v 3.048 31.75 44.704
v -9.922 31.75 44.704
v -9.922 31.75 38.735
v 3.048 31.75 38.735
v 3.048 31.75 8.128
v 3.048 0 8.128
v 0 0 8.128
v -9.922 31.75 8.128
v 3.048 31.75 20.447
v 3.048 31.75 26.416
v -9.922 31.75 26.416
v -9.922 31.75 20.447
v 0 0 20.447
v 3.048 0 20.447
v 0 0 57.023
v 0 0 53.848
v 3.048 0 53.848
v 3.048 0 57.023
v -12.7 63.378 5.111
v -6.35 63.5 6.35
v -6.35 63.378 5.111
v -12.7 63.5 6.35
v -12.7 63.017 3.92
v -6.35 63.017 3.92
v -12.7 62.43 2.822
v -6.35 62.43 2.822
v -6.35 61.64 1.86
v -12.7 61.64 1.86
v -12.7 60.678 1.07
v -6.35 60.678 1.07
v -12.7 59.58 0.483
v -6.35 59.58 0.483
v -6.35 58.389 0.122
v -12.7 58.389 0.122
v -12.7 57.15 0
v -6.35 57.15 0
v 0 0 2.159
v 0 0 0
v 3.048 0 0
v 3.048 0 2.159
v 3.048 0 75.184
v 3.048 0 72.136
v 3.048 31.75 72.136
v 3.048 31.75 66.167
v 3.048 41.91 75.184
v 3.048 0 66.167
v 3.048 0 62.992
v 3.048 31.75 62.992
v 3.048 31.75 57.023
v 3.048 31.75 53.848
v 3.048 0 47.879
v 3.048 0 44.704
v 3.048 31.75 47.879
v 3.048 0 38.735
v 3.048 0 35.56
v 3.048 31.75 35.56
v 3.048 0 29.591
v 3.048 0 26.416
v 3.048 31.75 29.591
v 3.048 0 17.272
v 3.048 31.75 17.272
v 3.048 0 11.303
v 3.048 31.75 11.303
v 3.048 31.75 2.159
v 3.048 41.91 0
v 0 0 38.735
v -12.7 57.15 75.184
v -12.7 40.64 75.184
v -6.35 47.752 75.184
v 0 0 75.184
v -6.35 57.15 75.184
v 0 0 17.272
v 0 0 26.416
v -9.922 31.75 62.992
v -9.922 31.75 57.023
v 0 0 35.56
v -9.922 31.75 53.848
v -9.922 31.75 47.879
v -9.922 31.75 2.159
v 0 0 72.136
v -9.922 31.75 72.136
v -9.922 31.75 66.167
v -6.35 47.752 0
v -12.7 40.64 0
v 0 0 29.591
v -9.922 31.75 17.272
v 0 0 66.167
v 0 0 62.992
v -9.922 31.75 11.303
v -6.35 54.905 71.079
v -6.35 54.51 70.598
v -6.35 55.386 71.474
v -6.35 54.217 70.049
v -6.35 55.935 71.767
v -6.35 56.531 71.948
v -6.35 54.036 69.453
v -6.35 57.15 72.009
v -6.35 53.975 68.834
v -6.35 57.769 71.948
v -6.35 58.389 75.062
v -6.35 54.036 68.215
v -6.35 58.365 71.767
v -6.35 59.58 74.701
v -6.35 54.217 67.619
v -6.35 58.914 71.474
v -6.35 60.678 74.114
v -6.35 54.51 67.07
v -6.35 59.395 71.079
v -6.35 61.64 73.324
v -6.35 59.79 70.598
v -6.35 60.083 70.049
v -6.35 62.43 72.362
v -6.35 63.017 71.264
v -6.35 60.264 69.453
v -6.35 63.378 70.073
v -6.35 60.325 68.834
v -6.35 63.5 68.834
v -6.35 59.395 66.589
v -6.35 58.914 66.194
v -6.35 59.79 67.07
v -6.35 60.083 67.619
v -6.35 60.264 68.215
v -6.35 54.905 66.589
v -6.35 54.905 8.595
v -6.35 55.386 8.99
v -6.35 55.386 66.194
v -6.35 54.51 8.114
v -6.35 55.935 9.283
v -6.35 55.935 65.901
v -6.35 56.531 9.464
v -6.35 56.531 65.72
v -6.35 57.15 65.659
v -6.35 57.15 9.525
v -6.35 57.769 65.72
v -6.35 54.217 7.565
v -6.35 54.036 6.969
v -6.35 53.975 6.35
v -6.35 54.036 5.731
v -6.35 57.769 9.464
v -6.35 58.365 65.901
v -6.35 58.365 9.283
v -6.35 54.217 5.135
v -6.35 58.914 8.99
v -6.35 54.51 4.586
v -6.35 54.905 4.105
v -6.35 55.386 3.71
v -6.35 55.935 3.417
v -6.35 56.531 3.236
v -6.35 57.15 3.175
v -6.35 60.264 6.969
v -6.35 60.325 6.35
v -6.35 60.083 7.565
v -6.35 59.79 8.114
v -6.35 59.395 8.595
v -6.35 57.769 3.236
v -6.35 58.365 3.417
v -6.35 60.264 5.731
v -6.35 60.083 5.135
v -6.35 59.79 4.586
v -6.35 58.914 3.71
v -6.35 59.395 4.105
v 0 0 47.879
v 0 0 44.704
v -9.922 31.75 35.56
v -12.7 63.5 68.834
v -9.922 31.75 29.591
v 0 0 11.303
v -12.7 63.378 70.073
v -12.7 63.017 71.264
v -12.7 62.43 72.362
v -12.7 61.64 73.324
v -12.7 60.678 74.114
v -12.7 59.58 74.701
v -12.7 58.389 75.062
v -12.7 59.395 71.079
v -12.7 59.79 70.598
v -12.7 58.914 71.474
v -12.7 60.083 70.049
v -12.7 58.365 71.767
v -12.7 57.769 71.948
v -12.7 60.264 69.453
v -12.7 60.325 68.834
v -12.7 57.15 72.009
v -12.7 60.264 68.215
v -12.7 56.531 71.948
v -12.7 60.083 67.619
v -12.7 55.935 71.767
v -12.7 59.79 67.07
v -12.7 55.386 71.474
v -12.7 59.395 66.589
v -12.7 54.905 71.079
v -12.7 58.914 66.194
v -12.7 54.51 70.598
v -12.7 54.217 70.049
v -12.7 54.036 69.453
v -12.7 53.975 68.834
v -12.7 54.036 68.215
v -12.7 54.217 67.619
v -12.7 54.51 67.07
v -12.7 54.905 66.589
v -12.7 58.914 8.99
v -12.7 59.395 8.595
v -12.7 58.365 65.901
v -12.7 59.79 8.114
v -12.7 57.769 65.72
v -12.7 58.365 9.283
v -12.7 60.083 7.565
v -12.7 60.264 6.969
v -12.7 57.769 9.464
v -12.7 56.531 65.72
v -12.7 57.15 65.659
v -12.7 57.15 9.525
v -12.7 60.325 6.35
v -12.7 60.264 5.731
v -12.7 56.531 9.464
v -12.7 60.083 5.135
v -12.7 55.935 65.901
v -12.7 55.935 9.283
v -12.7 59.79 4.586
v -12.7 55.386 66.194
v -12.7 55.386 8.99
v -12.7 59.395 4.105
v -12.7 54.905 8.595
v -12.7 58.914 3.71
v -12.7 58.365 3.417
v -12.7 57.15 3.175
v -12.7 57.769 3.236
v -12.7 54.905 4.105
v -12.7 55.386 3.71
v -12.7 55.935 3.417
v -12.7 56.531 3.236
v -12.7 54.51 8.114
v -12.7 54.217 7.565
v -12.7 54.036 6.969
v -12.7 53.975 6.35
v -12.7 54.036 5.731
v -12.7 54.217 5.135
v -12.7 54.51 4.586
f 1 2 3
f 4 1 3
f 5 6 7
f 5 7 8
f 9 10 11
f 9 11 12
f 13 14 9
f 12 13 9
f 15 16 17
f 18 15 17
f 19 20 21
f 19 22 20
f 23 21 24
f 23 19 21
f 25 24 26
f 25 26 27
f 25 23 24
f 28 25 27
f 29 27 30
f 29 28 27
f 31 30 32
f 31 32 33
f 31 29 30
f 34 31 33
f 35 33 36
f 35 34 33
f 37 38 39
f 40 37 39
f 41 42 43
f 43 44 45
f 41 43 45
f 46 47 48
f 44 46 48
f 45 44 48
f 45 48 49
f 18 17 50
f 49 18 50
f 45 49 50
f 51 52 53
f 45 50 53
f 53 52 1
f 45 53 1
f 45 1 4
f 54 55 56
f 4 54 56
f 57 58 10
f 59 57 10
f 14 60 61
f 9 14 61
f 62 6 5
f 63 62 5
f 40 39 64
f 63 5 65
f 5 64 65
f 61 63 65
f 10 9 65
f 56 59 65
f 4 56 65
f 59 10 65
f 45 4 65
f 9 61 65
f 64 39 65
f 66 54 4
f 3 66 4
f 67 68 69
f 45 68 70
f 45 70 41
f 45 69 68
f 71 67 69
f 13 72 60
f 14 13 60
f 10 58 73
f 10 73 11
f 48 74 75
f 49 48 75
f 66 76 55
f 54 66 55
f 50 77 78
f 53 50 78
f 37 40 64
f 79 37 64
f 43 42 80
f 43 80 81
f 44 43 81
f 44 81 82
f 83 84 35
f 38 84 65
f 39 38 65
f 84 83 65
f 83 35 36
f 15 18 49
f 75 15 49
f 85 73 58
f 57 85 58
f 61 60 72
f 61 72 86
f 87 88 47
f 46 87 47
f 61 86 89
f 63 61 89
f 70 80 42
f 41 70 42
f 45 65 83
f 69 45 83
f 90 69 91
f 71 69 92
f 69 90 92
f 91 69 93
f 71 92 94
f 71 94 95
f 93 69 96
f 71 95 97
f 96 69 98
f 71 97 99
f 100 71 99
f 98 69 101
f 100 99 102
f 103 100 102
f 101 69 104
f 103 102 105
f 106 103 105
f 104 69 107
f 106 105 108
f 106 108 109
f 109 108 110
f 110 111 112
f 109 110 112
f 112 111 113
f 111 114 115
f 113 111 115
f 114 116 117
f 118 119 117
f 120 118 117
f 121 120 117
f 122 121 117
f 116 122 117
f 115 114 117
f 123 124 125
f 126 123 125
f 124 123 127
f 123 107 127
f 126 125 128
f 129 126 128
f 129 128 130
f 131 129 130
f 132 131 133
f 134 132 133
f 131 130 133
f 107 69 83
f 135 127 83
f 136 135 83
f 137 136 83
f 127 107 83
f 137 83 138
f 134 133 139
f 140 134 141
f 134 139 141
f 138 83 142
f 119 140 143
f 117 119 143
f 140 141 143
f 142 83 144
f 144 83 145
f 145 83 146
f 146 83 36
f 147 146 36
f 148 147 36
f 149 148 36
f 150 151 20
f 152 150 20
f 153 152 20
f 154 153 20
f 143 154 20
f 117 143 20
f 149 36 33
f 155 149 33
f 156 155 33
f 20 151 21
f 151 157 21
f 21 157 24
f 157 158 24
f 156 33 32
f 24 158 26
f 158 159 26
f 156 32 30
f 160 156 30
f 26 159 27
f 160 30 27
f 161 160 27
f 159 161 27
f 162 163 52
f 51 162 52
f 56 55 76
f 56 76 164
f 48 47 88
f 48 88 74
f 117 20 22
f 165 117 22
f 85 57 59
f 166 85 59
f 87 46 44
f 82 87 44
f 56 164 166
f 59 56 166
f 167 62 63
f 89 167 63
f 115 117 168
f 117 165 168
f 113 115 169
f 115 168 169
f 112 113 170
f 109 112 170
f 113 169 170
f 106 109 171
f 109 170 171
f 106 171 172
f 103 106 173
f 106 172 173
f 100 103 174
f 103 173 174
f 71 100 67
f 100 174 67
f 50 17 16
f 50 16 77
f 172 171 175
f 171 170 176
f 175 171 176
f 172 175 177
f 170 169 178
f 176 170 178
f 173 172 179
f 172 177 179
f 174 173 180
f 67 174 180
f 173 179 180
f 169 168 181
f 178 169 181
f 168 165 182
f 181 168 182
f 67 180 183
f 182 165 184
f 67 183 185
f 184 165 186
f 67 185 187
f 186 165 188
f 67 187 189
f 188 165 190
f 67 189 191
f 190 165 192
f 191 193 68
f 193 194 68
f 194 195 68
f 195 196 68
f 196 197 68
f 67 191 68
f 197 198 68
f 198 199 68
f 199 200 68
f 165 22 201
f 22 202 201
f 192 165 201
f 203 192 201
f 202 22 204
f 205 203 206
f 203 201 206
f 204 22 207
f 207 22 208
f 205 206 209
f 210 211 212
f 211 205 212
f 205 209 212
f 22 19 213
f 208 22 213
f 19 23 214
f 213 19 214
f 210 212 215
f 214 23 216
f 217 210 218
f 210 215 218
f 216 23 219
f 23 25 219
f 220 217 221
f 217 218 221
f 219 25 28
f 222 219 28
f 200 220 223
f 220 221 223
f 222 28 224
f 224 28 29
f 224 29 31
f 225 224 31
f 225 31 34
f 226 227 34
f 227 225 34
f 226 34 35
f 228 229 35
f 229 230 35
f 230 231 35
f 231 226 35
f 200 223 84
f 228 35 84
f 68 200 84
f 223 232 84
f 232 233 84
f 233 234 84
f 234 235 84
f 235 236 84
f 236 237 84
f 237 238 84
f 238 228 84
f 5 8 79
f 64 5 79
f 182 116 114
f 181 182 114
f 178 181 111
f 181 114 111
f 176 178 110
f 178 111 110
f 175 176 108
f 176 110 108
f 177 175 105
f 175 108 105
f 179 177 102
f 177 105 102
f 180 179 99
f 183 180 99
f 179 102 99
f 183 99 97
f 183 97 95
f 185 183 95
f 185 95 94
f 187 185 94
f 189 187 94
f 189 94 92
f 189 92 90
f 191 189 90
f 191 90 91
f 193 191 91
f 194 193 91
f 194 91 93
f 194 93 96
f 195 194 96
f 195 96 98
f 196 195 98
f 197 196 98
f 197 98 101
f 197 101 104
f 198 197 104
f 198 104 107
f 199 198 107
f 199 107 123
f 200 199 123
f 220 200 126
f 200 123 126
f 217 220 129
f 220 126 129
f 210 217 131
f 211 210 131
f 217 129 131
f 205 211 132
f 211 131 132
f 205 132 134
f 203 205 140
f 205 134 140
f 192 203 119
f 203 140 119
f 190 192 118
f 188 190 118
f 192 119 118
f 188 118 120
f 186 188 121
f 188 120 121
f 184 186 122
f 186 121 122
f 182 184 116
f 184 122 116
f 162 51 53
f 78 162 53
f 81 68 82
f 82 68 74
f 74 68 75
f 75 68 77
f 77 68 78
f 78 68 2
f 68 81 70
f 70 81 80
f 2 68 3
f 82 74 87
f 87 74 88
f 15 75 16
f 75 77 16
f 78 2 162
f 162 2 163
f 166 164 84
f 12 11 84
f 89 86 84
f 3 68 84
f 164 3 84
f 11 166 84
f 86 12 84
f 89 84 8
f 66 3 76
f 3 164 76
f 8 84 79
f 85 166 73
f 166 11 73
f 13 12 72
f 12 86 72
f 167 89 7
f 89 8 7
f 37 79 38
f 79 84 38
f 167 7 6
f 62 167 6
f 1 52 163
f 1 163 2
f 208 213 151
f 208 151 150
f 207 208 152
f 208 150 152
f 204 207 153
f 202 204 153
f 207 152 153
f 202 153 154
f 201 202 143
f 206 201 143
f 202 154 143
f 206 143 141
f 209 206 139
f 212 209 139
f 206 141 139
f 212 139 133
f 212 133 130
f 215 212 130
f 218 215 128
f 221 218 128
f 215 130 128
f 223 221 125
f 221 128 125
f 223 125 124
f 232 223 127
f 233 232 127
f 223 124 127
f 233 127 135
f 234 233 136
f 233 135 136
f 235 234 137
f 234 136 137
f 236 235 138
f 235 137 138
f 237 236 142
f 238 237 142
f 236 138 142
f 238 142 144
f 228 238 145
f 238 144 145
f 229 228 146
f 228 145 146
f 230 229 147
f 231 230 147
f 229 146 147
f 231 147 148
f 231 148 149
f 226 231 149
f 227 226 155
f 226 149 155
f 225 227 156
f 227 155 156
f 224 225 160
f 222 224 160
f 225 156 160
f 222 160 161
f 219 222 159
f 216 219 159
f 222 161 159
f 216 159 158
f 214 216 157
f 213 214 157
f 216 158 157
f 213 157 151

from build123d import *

# Parameters (mm, degrees)
BOSS_EXTRUDE1_DEPTH = 75.184
FILLET1_R           = 6.35
SKETCH6_R           = 3.175
CUT_EXTRUDE2_DEPTH  = 62.992
SKETCH11_W          = 5.969
SKETCH11_H          = 31.75
CUT_EXTRUDE6_DEPTH  = 100.663851822


with BuildPart() as part:
    # Sketch1 → Boss-Extrude1 (new body)
    with BuildSketch(Plane.XY):
        Polygon((0, 0), (3.048, 0), (3.048, 41.91), (-6.35, 47.752), (-6.35, 63.5), (-12.7, 63.5), (-12.7, 40.64), align=None)
    extrude(amount=BOSS_EXTRUDE1_DEPTH)

    # Fillet1
    fillet1_edges = [part.edges().sort_by_distance(p)[0] for p in [
        (-9.525, 63.5, 75.184),
        (-9.525, 63.5, 0),
    ]]
    fillet(fillet1_edges, radius=FILLET1_R)

    # Sketch6 → Cut-Extrude2 (cut, symmetric)
    with BuildSketch(Plane(origin=(-6.35, 0, 0), x_dir=(0, 0, -1), z_dir=(1, 0, 0))):
        with Locations(Location((-68.834, 57.15, 0), (0, 0, 90))):
            Circle(SKETCH6_R)
        with Locations(Location((-6.35, 57.15, 0), (0, 0, 90))):
            Circle(SKETCH6_R)
    extrude(amount=CUT_EXTRUDE2_DEPTH, both=True, mode=Mode.SUBTRACT)

    # Sketch11 → Cut-Extrude6 (cut, through all)
    with BuildSketch(Plane(origin=(3.048, 0, 0), x_dir=(0, 0, -1), z_dir=(1, 0, 0))):
        with Locations((-69.1515, 15.875)):
            Rectangle(SKETCH11_W, SKETCH11_H)
        with Locations((-60.0075, 15.875)):
            Rectangle(SKETCH11_W, SKETCH11_H)
        with Locations((-50.8635, 15.875)):
            Rectangle(SKETCH11_W, SKETCH11_H)
        with Locations((-41.7195, 15.875)):
            Rectangle(SKETCH11_W, SKETCH11_H)
        with Locations((-32.5755, 15.875)):
            Rectangle(SKETCH11_W, SKETCH11_H)
        with Locations((-23.4315, 15.875)):
            Rectangle(SKETCH11_W, SKETCH11_H)
        with Locations((-14.2875, 15.875)):
            Rectangle(SKETCH11_W, SKETCH11_H)
        with Locations((-5.1435, 15.875)):
            Rectangle(SKETCH11_W, SKETCH11_H)
    extrude(amount=-CUT_EXTRUDE6_DEPTH, mode=Mode.SUBTRACT)


solid = part.part
